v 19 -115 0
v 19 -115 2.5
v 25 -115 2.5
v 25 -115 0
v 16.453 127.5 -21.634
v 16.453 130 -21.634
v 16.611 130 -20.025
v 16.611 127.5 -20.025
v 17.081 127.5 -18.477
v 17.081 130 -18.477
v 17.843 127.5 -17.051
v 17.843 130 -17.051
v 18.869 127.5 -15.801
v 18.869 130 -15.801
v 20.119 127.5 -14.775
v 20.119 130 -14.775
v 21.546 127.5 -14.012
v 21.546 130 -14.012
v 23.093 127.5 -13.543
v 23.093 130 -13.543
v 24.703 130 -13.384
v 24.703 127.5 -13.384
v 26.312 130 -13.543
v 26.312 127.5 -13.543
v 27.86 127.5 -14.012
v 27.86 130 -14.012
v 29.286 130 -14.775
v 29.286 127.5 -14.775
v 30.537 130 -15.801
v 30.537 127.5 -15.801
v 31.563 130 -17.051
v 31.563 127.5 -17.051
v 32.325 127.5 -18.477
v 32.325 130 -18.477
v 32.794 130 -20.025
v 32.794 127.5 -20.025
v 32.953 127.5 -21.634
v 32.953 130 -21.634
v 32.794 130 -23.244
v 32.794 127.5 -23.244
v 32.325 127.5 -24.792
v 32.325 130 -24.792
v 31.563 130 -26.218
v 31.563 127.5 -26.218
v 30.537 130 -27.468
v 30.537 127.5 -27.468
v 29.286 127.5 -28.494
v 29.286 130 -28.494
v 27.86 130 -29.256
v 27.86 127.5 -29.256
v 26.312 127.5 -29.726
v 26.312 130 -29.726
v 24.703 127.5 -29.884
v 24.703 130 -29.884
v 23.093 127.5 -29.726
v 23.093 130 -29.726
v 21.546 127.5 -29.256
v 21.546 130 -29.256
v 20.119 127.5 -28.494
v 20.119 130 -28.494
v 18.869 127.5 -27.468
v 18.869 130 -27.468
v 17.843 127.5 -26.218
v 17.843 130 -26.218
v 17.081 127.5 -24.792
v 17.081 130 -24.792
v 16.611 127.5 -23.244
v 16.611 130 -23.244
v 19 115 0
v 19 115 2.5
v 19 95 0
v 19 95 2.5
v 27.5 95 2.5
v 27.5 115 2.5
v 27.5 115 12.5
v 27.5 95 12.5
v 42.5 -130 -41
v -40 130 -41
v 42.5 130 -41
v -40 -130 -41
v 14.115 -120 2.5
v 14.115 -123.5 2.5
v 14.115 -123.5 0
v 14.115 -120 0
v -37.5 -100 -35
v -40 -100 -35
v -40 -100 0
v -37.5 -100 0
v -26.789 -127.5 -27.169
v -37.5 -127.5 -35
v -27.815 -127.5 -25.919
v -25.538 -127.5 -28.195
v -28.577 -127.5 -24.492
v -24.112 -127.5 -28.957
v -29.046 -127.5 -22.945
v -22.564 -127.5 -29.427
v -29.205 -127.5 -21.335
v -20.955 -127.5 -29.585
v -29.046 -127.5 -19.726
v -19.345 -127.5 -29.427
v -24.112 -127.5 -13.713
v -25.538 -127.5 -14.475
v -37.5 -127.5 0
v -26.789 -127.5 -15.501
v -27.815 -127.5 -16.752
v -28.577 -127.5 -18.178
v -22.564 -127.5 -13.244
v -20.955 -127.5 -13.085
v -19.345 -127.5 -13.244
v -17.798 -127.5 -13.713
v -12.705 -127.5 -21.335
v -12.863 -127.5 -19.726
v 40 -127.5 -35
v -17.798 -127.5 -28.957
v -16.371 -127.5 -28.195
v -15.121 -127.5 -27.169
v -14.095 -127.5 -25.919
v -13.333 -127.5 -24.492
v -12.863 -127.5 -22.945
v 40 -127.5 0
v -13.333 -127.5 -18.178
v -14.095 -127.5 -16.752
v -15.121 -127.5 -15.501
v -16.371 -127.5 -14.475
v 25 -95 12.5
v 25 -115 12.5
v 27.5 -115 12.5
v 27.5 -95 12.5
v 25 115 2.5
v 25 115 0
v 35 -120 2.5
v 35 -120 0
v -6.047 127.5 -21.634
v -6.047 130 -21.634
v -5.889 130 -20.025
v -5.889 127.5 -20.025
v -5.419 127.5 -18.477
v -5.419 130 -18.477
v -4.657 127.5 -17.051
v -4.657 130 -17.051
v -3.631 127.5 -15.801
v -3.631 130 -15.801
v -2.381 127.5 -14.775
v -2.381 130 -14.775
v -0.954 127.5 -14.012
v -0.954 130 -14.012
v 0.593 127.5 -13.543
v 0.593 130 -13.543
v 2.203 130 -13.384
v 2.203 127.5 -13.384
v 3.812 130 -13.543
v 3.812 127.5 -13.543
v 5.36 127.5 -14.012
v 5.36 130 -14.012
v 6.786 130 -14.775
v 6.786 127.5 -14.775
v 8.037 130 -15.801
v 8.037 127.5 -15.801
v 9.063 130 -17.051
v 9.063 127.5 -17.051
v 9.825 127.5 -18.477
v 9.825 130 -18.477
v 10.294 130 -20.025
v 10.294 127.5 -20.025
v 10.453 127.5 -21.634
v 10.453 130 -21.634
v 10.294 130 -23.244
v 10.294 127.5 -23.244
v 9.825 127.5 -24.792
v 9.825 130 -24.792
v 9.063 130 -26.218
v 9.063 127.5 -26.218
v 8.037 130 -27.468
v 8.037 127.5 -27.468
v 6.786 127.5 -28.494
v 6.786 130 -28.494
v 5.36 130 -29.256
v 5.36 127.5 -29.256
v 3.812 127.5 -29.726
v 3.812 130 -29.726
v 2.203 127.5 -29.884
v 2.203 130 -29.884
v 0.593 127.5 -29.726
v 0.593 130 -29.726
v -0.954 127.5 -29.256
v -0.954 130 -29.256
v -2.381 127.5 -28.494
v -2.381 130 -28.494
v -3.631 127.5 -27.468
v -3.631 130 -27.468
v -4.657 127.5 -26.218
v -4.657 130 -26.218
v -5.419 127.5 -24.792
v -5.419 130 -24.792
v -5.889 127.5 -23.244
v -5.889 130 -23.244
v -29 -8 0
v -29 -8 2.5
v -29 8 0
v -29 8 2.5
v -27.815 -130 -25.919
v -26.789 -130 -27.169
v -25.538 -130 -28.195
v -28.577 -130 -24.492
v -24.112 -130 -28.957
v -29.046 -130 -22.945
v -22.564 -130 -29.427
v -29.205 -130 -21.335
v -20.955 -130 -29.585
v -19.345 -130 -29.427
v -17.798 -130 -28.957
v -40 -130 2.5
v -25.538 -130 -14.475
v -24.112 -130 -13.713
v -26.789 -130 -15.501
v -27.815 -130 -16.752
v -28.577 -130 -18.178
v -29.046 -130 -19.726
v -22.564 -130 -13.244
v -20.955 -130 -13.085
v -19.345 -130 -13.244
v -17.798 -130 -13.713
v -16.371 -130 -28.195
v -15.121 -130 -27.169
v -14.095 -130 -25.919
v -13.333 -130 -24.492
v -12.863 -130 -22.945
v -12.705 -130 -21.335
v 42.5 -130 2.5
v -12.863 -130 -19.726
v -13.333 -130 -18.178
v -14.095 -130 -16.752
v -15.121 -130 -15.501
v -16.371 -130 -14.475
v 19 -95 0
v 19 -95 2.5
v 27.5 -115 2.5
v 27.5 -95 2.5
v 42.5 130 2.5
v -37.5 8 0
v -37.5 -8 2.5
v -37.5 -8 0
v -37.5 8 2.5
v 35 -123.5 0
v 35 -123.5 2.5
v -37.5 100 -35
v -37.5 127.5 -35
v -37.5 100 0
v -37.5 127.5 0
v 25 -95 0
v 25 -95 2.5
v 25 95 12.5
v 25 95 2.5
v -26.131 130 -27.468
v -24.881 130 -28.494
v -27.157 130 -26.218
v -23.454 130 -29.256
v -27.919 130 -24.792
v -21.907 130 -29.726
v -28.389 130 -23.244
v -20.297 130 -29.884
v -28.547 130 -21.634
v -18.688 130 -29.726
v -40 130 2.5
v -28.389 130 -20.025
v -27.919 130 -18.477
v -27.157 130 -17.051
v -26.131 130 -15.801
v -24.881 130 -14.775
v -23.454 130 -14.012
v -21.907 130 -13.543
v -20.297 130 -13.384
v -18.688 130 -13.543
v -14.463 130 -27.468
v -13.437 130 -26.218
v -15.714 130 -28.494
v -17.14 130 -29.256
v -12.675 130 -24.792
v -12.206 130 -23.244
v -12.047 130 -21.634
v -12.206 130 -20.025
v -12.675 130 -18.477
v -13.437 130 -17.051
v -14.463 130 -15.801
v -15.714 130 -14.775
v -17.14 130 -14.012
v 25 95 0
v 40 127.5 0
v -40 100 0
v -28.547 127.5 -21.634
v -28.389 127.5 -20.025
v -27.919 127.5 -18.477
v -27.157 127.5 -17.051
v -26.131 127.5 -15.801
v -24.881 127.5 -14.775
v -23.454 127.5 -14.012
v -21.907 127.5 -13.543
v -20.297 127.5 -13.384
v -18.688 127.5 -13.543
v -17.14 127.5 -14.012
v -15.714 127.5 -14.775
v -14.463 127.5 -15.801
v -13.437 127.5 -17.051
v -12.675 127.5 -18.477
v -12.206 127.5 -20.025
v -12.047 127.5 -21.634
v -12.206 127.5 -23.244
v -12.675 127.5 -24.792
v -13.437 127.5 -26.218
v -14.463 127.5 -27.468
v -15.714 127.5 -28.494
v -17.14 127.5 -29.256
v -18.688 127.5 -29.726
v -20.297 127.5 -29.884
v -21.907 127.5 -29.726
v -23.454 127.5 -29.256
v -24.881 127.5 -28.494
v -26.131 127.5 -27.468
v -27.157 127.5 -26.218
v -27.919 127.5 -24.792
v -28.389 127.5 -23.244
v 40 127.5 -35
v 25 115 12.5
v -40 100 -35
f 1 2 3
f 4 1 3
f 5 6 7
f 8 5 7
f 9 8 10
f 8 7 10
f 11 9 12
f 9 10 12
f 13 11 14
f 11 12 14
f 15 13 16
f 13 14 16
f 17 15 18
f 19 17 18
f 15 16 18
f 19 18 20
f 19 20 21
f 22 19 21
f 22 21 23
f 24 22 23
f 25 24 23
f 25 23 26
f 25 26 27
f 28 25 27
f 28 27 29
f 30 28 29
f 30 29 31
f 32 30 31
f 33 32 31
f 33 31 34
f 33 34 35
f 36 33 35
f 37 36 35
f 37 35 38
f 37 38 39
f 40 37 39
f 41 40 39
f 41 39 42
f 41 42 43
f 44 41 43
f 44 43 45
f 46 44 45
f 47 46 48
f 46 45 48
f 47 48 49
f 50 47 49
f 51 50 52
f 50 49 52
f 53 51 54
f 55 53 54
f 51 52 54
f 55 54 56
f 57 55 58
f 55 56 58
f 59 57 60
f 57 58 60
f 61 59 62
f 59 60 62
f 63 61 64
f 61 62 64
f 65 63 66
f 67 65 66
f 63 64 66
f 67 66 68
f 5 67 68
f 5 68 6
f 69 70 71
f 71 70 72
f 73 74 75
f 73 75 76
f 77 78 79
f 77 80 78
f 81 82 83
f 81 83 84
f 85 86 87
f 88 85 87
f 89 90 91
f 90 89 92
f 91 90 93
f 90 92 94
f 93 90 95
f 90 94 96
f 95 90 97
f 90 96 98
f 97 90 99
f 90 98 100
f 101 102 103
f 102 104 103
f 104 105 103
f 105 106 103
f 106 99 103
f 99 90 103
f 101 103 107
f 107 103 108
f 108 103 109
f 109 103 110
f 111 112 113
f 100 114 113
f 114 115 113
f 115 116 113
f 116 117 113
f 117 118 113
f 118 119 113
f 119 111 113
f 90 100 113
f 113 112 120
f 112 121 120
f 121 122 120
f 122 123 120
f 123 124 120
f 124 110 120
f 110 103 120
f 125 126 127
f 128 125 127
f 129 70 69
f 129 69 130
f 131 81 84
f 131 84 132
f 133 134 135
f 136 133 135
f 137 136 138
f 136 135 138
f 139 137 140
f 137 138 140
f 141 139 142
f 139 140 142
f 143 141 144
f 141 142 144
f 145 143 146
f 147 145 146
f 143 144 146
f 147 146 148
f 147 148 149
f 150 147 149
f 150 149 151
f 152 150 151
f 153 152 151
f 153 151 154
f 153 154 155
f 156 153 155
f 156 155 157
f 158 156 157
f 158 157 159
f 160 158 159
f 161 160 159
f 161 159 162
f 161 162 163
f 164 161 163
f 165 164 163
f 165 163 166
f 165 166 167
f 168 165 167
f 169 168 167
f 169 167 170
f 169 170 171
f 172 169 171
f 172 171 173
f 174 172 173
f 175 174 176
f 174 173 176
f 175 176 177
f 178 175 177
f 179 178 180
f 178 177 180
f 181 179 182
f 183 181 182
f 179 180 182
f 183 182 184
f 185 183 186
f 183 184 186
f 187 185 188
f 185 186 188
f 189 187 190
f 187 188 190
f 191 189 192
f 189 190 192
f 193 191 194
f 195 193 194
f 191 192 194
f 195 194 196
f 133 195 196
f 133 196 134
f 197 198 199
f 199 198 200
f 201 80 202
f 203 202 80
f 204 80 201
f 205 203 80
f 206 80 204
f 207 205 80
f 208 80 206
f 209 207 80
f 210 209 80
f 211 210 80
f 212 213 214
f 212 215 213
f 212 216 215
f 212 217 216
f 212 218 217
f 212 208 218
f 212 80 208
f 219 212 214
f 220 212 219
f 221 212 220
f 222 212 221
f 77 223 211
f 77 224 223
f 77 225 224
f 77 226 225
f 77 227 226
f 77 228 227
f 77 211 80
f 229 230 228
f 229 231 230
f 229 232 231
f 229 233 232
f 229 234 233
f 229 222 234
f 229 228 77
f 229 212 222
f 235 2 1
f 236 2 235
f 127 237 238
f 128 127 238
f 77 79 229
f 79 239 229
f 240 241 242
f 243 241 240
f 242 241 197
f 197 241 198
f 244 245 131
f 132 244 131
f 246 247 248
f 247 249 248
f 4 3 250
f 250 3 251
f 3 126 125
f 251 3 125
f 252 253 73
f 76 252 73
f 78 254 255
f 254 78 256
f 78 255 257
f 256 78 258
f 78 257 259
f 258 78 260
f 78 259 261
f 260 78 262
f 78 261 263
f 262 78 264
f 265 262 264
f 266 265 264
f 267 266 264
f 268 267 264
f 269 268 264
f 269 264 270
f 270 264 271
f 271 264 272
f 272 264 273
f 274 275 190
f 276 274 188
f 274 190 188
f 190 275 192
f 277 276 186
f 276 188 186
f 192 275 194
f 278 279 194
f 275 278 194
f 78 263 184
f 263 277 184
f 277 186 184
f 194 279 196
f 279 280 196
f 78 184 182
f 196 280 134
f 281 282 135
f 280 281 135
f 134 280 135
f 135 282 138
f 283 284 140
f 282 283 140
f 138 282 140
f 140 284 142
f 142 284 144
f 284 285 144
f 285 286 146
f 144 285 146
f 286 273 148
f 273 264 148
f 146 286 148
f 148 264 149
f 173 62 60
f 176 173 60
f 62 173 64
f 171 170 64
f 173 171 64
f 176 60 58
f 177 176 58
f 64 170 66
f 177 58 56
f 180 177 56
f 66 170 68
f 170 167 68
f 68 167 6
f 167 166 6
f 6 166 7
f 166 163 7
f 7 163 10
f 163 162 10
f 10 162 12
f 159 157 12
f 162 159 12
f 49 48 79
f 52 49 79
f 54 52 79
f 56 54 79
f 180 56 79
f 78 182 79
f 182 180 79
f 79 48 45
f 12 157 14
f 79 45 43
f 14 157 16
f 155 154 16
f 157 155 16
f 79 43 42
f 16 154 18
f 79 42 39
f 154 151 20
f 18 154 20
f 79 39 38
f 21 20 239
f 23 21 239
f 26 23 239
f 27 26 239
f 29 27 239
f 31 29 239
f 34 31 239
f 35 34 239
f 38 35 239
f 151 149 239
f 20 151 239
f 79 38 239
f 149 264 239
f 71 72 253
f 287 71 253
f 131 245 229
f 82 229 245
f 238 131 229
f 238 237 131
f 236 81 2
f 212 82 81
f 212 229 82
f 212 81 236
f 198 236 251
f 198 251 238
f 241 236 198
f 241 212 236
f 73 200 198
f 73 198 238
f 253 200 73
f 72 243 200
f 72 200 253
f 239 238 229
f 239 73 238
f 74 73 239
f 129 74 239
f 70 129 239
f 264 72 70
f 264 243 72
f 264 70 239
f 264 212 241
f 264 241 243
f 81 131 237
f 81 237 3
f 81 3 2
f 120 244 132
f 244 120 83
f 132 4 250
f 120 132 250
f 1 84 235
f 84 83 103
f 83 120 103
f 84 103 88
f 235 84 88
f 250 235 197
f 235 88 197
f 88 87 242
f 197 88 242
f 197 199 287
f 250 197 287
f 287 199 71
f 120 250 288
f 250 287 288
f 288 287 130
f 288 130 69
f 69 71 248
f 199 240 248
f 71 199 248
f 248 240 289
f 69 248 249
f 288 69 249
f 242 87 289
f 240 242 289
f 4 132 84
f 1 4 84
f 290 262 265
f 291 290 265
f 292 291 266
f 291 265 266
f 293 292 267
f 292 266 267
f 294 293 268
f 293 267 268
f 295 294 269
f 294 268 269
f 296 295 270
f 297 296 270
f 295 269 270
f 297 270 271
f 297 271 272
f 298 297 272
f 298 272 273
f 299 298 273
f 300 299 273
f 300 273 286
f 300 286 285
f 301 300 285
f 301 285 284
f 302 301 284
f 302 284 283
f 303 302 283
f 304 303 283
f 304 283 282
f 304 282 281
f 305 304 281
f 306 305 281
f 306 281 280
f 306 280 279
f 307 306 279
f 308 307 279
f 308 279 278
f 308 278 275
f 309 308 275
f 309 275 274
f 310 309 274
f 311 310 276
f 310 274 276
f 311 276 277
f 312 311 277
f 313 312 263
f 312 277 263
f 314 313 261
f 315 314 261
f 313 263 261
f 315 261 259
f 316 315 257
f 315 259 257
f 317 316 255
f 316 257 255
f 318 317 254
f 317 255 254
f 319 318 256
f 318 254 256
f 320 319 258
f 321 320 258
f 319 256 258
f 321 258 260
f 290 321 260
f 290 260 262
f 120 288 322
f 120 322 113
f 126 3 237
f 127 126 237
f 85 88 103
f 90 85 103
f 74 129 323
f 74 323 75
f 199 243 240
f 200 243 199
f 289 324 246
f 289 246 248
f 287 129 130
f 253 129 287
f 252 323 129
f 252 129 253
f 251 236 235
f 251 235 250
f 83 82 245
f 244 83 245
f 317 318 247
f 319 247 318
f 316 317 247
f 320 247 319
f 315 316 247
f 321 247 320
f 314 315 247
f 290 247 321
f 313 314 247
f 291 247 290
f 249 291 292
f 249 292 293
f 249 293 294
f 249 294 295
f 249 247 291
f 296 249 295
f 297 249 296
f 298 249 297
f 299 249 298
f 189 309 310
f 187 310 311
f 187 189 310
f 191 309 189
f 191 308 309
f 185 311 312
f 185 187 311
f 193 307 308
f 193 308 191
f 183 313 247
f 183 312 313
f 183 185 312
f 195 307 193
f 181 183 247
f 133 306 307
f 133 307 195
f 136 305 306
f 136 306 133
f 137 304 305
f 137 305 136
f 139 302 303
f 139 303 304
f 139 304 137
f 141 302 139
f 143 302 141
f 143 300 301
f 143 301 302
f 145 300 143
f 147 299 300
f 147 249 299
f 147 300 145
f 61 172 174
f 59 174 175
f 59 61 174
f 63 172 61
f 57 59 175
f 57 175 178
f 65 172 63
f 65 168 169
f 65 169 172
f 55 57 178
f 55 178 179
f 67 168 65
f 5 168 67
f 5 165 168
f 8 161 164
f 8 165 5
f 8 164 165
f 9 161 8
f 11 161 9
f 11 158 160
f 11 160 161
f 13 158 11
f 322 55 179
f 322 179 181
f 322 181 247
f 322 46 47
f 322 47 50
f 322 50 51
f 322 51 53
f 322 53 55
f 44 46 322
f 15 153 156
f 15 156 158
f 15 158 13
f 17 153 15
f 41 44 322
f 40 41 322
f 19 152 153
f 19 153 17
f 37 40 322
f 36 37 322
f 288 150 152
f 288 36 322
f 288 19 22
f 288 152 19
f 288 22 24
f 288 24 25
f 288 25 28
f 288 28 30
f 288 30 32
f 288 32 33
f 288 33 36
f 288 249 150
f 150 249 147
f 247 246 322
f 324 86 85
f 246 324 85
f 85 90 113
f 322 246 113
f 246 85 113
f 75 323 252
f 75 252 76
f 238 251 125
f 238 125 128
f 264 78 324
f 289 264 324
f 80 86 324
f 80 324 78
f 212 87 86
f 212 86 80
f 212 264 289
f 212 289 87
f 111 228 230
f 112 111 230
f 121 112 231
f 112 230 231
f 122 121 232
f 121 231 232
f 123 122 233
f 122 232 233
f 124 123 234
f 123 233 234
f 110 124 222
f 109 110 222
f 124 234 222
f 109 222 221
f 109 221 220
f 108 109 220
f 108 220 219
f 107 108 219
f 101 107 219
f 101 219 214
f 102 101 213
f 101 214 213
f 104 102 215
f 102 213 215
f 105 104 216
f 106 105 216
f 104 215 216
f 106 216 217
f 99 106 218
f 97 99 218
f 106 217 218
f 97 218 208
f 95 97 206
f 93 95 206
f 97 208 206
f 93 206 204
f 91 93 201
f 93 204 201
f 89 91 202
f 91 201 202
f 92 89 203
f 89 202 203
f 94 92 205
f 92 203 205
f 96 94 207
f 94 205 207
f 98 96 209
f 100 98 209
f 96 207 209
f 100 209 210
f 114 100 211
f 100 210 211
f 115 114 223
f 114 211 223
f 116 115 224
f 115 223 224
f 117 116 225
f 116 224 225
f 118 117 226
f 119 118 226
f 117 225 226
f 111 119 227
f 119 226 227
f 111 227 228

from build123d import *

# Parameters (mm, degrees)
SKETCH1_W           = 260
SKETCH1_H           = 85
BOSS_EXTRUDE1_DEPTH = 2.5
SKETCH2_W           = 85
SKETCH2_H           = 260
SKETCH2_W_2         = 80
SKETCH2_H_2         = 255
BOSS_EXTRUDE2_DEPTH = 35
SKETCH3_W           = 85
SKETCH3_H           = 260
BOSS_EXTRUDE3_DEPTH = 6
SKETCH4_W           = 260
SKETCH4_H           = 43.5
CUT_EXTRUDE1_DEPTH  = 2.5
CUT_EXTRUDE2_REACH  = 45.5
SKETCH5_W           = 8.5
SKETCH5_H           = 16
SKETCH14_R          = 8.25
CUT_EXTRUDE8_DEPTH  = 2.5
SKETCH22_R          = 8.25
CUT_EXTRUDE9_DEPTH  = 10
CUT_EXTRUDE11_REACH = 45.5
SKETCH25_W          = 20.88469263
SKETCH25_H          = 3.5
SKETCH27_W          = 30
SKETCH27_H          = 43.5
BOSS_EXTRUDE4_DEPTH = 2.5
SKETCH29_W          = 2.5
SKETCH29_H          = 20
BOSS_EXTRUDE5_DEPTH = 10
SKETCH30_W          = 6
SKETCH30_H          = 20
CUT_EXTRUDE12_DEPTH = 5


with BuildPart() as part:
    # Sketch1 → Boss-Extrude1 (new body)
    with BuildSketch(Plane(origin=(0, 0, 0), x_dir=(0, 1, 0), z_dir=(0, 0, 1))):
        Rectangle(SKETCH1_W, SKETCH1_H)
    extrude(amount=BOSS_EXTRUDE1_DEPTH)

    # Sketch2 → Boss-Extrude2 (add)
    with BuildSketch(Plane(origin=(0, 0, 0), x_dir=(1, 0, 0), z_dir=(0, 0, -1))):
        Rectangle(SKETCH2_W, SKETCH2_H)
        Rectangle(SKETCH2_W_2, SKETCH2_H_2, mode=Mode.SUBTRACT)
    extrude(amount=BOSS_EXTRUDE2_DEPTH)

    # Sketch3 → Boss-Extrude3 (add)
    with BuildSketch(Plane(origin=(0, 0, -35), x_dir=(1, 0, 0), z_dir=(0, 0, -1))):
        Rectangle(SKETCH3_W, SKETCH3_H)
    extrude(amount=BOSS_EXTRUDE3_DEPTH)

    # Sketch4 → Cut-Extrude1 (cut)
    with BuildSketch(Plane(origin=(-42.5, 0, 0), x_dir=(0, -1, 0), z_dir=(-1, 0, 0))):
        with Locations((0, -19.25)):
            Rectangle(SKETCH4_W, SKETCH4_H)
    extrude(amount=-CUT_EXTRUDE1_DEPTH, mode=Mode.SUBTRACT)

    # Sketch5 → Cut-Extrude2 (cut, up to next)
    with BuildSketch(Plane.XY.offset(2.5), mode=Mode.PRIVATE) as cut_extrude2_sk1:
        with Locations((-33.25, 0)):
            Rectangle(SKETCH5_W, SKETCH5_H)
    cut_extrude2_tool1 = extrude(cut_extrude2_sk1.sketch, amount=-CUT_EXTRUDE2_REACH, mode=Mode.PRIVATE) & part.part
    add(cut_extrude2_tool1.solids().sort_by_distance((-33.25, 0, 2.5))[0], mode=Mode.SUBTRACT)

    # Sketch14 → Cut-Extrude8 (cut)
    with BuildSketch(Plane.XZ.offset(130)):
        with Locations((-20.95492543, -21.33509917)):
            Circle(SKETCH14_R)
    extrude(amount=-CUT_EXTRUDE8_DEPTH, mode=Mode.SUBTRACT)

    # Sketch22 → Cut-Extrude9 (cut)
    with BuildSketch(Plane(origin=(0, 130, 0), x_dir=(-1, 0, 0), z_dir=(0, 1, 0))):
        with Locations((-24.702923979, -21.634364917)):
            Circle(SKETCH22_R)
        with Locations((-2.202923979, -21.634364917)):
            Circle(SKETCH22_R)
        with Locations((20.297076021, -21.634364917)):
            Circle(SKETCH22_R)
    extrude(amount=-CUT_EXTRUDE9_DEPTH, mode=Mode.SUBTRACT)

    # Sketch25 → Cut-Extrude11 (cut, up to next)
    with BuildSketch(Plane.XY.offset(2.5), mode=Mode.PRIVATE) as cut_extrude11_sk1:
        with Locations((24.557653685, -121.75)):
            Rectangle(SKETCH25_W, SKETCH25_H)
    cut_extrude11_tool1 = extrude(cut_extrude11_sk1.sketch, amount=-CUT_EXTRUDE11_REACH, mode=Mode.PRIVATE) & part.part
    add(cut_extrude11_tool1.solids().sort_by_distance((24.557654, -121.75, 2.5))[0], mode=Mode.SUBTRACT)

    # Sketch27 → Boss-Extrude4 (add)
    with BuildSketch(Plane(origin=(-40, 0, 0), x_dir=(0, -1, 0), z_dir=(-1, 0, 0))):
        with Locations((-115, -19.25)):
            Rectangle(SKETCH27_W, SKETCH27_H)
        with Locations((115, -19.25)):
            Rectangle(SKETCH27_W, SKETCH27_H)
    extrude(amount=-BOSS_EXTRUDE4_DEPTH)

    # Sketch29 → Boss-Extrude5 (add)
    with BuildSketch(Plane.XY.offset(2.5)):
        with Locations((26.25, -105)):
            Rectangle(SKETCH29_W, SKETCH29_H)
    boss_extrude5 = extrude(amount=BOSS_EXTRUDE5_DEPTH)

    # Sketch30 → Cut-Extrude12 (cut)
    with BuildSketch(Plane.XY.offset(2.5)):
        with Locations((22, -105)):
            Rectangle(SKETCH30_W, SKETCH30_H)
    cut_extrude12 = extrude(amount=-CUT_EXTRUDE12_DEPTH, mode=Mode.SUBTRACT)

    # Mirror2: Boss-Extrude5, Cut-Extrude12 across plane
    add(boss_extrude5.mirror(Plane.ZX))
    add(cut_extrude12.mirror(Plane.ZX), mode=Mode.SUBTRACT)


solid = part.part
